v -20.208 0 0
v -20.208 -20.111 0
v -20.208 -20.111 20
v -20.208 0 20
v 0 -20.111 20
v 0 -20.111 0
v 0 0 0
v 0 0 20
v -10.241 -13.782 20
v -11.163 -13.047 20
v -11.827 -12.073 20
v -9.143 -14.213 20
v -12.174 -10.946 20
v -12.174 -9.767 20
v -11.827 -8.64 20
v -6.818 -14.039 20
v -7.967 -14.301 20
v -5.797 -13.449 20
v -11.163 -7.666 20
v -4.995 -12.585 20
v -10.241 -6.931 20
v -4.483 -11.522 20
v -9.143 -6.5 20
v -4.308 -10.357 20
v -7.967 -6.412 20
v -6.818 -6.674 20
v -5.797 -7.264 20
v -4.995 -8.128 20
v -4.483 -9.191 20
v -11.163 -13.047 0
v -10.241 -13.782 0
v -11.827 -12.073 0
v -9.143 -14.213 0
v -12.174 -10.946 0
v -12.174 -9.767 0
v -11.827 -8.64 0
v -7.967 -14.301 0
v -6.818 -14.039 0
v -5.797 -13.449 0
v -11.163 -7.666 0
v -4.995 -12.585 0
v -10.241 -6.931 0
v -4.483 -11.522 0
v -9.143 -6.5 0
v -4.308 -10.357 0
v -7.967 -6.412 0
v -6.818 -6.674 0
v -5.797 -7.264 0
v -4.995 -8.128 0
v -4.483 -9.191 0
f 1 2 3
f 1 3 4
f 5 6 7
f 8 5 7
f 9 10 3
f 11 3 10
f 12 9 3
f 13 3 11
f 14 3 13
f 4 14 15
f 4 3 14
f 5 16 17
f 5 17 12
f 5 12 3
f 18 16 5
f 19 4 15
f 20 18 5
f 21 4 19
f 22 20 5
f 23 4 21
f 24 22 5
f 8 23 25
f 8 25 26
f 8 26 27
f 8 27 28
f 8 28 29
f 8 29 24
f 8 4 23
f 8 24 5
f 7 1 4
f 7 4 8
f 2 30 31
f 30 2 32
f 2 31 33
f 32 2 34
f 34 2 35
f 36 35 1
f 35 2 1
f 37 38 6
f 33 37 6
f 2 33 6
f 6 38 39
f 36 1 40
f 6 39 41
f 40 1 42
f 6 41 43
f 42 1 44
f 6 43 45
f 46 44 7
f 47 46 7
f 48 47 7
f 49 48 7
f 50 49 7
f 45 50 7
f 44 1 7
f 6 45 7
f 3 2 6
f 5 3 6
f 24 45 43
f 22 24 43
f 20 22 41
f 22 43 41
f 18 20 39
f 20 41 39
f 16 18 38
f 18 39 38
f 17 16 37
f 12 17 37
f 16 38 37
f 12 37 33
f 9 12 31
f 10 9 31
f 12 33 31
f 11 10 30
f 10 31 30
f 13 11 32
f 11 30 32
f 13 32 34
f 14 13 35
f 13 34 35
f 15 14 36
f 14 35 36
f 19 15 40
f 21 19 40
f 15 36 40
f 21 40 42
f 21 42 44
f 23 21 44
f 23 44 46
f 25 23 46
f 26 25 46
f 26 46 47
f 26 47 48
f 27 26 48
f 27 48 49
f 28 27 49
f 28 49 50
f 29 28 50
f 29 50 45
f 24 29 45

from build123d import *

# Parameters (mm, degrees)
F0_W     = 20.2084705234
F0_H     = 20.1108679175
F1_DEPTH = 20
F3_R     = 3.9554921295
F3_R_2   = 2.3007028816
F3_R_3   = 1.330304551
F4_DEPTH = 25


with BuildPart() as f1:
    # F0 (on Top) → F1 (new body)
    with BuildSketch(Plane.XY):
        with Locations((-10.1042352617, -10.0554339588)):
            Rectangle(F0_W, F0_H)
    extrude(amount=F1_DEPTH)

    # F3 (on face) → F4 (cut)
    with BuildSketch(Plane(origin=(0, 0, 0), x_dir=(1, 0, 0), z_dir=(0, 0, -1))):
        with Locations((-8.2629937679, 10.3565575555)):
            Circle(F3_R)
        with Locations((-8.2629937679, 10.3565575555)):
            Circle(F3_R_2, mode=Mode.SUBTRACT)
        with Locations((-8.2629937679, 10.3565575555)):
            Circle(F3_R_2)
        with Locations((-8.2629937679, 10.3565575555)):
            Circle(F3_R_3, mode=Mode.SUBTRACT)
        with Locations((-8.2629937679, 10.3565575555)):
            Circle(F3_R_3)
    extrude(amount=-F4_DEPTH, mode=Mode.SUBTRACT)


solid = f1.part
